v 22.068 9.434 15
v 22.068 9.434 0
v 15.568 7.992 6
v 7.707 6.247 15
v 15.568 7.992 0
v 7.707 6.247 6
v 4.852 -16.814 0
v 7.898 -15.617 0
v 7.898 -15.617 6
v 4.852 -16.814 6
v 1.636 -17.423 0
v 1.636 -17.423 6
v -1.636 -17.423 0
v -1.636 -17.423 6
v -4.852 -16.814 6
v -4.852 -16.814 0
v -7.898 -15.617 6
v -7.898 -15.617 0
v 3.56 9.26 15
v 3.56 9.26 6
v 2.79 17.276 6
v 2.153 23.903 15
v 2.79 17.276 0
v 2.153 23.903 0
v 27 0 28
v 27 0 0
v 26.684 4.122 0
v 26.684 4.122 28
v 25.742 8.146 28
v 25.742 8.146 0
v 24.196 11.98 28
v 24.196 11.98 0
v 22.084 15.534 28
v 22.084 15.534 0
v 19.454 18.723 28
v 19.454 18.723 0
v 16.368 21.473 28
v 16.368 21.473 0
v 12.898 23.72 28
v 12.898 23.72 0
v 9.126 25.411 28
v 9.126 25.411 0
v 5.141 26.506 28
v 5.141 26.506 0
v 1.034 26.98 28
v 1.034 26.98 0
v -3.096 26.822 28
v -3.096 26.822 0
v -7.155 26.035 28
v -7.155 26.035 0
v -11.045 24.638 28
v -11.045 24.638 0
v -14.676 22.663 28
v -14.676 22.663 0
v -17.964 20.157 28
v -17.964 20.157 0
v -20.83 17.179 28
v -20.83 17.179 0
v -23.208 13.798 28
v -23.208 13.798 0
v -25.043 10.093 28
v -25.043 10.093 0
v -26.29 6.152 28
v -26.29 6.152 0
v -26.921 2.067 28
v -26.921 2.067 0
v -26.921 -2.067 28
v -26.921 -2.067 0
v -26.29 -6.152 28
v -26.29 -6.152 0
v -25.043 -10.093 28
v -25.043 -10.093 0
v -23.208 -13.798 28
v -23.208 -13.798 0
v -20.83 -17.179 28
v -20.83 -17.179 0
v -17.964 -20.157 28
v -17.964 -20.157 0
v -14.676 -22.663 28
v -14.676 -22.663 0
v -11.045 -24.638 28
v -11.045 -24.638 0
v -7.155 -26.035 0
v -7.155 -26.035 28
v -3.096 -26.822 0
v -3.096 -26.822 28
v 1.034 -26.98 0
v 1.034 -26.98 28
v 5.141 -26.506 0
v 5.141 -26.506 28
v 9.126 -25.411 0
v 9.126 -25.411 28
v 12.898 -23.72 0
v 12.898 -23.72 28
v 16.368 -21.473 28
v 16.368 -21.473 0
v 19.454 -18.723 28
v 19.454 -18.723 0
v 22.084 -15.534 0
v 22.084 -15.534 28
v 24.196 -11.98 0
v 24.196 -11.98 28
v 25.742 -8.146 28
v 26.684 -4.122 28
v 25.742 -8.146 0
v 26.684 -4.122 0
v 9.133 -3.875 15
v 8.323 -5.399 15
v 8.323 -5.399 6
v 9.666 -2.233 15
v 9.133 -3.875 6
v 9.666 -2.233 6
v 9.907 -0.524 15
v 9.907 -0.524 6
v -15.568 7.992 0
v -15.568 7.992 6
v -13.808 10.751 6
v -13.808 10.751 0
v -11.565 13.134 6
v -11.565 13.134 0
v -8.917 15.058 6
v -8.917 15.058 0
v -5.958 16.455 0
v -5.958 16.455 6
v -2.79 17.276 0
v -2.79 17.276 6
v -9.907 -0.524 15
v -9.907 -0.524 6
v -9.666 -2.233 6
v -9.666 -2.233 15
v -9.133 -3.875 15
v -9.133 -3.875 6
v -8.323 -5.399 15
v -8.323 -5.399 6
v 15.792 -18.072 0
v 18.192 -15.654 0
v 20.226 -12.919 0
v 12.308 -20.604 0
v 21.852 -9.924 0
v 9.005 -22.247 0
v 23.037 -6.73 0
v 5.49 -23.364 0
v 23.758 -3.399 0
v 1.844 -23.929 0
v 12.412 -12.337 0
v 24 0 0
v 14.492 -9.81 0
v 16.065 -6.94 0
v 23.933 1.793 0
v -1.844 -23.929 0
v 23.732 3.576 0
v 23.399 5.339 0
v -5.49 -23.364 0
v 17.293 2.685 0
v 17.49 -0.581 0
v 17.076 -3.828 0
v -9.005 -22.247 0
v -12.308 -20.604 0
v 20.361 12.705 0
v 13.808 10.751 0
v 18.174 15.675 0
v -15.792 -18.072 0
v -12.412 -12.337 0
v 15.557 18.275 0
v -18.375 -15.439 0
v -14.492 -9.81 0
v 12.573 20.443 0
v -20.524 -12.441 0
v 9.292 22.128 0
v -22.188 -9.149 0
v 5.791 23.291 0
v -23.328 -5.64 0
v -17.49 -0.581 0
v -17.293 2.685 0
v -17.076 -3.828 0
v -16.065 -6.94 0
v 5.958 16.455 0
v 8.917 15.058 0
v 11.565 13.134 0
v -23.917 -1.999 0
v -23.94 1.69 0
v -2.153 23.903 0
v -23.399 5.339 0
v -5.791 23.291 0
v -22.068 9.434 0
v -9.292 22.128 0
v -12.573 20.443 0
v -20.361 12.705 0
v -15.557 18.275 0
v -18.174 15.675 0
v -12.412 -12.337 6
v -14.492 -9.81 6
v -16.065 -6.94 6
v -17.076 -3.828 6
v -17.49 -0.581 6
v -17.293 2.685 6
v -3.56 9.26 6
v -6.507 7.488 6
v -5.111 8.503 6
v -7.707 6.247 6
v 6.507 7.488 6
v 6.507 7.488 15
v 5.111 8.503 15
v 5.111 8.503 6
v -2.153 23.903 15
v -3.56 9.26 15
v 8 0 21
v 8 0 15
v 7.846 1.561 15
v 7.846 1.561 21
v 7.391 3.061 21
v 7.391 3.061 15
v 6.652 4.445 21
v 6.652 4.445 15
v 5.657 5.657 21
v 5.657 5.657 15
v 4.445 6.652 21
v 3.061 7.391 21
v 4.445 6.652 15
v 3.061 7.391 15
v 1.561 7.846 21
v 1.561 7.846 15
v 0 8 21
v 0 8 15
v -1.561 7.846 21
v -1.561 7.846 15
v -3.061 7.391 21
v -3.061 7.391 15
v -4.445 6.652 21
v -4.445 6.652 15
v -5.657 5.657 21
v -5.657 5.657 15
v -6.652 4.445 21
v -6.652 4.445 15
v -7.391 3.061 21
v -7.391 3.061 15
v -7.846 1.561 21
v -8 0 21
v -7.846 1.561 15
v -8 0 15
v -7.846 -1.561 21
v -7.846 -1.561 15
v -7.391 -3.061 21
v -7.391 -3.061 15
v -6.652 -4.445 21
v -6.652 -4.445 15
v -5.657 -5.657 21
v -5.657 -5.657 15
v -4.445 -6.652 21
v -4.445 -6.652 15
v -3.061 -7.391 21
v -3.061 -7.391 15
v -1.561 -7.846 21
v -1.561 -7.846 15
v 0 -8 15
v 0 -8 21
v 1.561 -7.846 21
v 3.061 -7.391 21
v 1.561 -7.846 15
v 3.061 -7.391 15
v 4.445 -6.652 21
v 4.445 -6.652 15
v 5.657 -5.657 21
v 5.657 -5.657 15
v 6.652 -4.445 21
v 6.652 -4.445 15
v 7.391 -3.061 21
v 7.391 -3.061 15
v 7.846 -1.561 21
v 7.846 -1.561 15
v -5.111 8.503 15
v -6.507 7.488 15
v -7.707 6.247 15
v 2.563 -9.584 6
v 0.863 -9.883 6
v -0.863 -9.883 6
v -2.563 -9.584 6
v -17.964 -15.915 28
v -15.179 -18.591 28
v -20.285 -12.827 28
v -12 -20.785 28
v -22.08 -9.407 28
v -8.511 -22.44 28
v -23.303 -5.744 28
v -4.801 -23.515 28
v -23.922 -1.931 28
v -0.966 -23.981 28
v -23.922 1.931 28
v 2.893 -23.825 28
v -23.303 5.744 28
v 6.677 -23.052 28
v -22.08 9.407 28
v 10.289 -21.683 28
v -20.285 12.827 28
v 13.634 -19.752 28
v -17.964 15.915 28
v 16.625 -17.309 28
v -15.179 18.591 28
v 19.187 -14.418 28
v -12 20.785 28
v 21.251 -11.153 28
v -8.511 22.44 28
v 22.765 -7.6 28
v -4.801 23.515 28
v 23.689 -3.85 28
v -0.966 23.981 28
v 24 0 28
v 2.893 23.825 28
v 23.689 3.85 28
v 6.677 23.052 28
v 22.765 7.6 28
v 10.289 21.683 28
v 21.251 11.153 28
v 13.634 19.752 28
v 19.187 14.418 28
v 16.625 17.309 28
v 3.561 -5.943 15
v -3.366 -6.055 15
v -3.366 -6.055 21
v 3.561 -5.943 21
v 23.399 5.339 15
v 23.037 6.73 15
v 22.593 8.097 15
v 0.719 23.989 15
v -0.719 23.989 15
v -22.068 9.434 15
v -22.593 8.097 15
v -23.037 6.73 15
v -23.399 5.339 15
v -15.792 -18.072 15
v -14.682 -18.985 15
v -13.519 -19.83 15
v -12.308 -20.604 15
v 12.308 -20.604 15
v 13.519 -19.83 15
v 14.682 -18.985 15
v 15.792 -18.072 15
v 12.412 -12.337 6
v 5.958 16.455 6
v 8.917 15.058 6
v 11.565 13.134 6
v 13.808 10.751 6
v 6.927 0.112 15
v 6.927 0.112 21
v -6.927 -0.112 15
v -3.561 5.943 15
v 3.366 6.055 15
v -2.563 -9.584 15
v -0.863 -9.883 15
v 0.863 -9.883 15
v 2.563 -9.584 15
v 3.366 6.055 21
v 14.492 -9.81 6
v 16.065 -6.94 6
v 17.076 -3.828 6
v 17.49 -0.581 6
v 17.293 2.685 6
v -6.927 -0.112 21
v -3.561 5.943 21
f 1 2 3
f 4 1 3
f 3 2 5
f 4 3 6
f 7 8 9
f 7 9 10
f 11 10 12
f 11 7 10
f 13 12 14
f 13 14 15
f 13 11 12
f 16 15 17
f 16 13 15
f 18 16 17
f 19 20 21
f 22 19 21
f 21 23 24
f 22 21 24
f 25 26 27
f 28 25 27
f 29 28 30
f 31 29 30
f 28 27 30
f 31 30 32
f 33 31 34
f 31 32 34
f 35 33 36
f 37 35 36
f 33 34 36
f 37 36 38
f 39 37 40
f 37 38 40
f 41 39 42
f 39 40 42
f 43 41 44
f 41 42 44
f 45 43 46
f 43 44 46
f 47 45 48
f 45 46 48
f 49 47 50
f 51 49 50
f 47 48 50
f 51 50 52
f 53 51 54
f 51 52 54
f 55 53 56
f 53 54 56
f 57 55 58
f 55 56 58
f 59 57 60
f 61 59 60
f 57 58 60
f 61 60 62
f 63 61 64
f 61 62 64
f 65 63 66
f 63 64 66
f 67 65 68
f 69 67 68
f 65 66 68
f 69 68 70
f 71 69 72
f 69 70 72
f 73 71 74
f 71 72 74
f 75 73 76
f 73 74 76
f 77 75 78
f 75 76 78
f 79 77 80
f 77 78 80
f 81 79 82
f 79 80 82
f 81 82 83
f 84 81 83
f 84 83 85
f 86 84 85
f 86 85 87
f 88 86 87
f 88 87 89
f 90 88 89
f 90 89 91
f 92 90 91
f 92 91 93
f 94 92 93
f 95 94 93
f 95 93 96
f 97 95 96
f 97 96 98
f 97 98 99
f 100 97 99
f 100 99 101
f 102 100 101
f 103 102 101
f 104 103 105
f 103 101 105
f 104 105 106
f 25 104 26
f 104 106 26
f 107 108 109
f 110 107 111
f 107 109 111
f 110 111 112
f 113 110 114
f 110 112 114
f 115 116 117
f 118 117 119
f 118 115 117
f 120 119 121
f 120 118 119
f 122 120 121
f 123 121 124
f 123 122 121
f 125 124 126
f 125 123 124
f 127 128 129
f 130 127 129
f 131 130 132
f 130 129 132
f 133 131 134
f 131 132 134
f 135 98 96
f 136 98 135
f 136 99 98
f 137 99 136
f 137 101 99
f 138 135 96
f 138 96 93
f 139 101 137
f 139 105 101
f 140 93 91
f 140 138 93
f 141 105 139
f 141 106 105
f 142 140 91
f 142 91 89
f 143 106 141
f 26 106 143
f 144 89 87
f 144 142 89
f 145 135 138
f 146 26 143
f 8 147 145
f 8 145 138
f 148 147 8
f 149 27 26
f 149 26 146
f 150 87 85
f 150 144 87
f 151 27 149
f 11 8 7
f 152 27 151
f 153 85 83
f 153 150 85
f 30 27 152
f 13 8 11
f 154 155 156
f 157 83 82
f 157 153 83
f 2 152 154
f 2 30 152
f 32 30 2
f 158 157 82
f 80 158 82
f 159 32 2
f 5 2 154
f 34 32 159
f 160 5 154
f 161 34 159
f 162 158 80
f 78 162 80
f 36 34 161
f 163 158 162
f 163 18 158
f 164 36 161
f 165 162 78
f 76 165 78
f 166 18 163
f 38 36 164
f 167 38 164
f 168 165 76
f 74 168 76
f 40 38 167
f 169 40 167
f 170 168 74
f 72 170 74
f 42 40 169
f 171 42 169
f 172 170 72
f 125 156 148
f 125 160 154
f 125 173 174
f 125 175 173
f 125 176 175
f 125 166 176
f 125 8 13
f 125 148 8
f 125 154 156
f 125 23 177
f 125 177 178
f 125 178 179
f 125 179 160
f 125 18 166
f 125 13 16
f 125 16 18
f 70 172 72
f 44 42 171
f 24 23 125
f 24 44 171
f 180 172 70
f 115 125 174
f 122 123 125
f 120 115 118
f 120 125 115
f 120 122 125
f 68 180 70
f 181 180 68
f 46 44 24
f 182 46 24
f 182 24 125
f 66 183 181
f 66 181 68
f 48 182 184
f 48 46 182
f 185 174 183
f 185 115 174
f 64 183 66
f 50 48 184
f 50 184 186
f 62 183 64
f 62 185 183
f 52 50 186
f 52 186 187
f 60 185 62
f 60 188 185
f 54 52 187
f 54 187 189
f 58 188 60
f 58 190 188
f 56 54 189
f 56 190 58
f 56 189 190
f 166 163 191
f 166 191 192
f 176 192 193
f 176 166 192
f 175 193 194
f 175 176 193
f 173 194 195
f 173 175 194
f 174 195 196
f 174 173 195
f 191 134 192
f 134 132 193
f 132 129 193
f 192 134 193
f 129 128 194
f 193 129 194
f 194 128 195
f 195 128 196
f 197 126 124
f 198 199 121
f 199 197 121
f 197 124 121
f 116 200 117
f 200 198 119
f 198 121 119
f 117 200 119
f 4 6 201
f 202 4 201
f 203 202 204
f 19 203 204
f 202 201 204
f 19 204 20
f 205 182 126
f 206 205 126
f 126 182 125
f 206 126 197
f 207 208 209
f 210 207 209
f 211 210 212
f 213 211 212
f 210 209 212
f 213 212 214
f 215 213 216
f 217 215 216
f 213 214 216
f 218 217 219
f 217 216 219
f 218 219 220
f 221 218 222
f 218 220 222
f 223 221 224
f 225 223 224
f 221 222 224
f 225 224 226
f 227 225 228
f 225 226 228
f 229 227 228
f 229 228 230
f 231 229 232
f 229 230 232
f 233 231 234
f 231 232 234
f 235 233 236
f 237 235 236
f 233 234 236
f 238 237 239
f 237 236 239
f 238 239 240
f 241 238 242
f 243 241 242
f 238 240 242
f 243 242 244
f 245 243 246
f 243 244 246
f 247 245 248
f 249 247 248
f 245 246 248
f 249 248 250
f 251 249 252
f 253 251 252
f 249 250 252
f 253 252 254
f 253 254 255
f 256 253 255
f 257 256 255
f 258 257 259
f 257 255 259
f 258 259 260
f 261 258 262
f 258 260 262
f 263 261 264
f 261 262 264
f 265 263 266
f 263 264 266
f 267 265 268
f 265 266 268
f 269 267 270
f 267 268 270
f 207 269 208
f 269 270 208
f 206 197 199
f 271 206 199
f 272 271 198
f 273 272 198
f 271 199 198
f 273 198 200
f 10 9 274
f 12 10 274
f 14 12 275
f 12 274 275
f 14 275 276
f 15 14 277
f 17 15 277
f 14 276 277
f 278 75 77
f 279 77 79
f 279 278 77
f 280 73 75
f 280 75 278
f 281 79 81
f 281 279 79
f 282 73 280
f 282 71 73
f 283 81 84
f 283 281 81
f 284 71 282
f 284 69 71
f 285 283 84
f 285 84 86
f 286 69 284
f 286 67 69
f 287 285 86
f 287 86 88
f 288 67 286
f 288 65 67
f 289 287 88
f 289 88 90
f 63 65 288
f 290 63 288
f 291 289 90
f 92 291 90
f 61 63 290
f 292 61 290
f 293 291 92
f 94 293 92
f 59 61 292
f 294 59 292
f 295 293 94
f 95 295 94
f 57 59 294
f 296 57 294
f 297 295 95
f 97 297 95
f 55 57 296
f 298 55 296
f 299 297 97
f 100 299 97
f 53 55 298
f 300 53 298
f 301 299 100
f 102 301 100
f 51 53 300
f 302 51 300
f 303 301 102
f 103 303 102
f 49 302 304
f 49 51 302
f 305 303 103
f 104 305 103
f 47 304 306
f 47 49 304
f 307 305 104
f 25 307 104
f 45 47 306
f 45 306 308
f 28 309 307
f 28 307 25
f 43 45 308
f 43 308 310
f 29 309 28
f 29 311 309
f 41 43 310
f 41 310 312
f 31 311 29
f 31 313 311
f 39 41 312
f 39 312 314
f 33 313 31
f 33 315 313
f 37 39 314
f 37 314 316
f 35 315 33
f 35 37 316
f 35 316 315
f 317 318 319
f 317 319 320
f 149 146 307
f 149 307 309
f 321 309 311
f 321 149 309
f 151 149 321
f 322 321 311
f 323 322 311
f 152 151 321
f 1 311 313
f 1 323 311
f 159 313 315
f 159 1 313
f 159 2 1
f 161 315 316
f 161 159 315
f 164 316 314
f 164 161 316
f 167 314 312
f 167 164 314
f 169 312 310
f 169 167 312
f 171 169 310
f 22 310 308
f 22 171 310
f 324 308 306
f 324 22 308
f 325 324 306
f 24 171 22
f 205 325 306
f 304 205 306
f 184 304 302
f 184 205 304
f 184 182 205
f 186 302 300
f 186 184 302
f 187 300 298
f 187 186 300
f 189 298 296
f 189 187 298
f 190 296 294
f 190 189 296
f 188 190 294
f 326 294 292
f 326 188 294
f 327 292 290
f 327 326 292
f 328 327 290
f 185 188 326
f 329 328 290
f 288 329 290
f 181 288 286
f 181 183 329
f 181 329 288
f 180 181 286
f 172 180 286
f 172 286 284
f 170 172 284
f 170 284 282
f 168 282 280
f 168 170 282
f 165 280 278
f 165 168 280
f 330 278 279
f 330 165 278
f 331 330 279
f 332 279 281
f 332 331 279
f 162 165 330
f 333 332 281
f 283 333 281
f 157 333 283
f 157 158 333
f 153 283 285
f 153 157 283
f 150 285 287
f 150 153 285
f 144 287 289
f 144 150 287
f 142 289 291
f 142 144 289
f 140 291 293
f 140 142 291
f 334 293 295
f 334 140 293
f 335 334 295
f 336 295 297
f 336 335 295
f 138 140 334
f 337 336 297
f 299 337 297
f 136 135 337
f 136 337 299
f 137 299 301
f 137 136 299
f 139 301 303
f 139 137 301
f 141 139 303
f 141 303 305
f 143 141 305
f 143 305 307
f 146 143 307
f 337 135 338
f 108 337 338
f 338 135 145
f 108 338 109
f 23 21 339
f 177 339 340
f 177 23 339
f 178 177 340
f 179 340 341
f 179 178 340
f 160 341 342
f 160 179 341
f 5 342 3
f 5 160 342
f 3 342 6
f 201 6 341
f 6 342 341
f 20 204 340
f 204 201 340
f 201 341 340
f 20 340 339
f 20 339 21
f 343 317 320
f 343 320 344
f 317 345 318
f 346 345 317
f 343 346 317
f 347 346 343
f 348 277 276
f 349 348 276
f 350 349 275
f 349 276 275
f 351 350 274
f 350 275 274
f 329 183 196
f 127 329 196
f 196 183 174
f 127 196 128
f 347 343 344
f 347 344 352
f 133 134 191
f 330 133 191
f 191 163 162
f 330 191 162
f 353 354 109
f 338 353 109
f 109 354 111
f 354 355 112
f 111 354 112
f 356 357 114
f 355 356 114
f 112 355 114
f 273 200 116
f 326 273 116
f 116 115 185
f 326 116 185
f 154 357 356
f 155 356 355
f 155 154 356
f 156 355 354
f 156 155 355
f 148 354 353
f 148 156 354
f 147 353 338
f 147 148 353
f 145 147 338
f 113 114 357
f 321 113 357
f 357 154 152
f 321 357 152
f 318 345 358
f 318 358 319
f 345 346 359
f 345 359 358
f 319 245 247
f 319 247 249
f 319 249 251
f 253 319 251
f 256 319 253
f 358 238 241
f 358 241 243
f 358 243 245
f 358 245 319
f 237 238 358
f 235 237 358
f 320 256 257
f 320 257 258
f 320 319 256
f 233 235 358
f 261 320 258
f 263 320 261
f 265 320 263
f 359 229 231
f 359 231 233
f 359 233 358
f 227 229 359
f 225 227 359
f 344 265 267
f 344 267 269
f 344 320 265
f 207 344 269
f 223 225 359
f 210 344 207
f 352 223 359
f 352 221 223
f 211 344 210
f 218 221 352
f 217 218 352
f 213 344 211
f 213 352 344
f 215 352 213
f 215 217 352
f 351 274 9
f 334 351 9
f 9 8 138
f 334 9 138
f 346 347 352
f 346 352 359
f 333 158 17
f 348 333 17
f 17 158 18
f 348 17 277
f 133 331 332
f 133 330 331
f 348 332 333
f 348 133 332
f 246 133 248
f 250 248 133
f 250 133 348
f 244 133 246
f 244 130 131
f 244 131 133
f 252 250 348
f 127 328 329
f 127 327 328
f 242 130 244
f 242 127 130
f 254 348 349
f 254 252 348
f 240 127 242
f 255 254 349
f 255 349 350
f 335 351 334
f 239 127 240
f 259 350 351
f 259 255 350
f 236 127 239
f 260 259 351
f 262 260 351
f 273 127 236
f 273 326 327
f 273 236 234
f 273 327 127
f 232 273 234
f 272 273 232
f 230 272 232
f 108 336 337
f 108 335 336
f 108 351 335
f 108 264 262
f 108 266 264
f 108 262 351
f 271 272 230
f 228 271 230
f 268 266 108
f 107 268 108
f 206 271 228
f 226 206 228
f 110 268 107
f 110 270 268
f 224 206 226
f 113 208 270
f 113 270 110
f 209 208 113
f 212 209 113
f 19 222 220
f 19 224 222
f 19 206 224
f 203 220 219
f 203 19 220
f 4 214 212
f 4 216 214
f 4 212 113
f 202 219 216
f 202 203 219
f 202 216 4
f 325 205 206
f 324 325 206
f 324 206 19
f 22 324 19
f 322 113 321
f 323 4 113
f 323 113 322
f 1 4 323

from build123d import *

# Parameters (mm, degrees)
SKETCH_1_R      = 27
SKETCH_1_R_2    = 24
EXTRUDE_1_DEPTH = 28
EXTRUDE_2_DEPTH = 15
SKETCH_3_R      = 8
EXTRUDE_3_DEPTH = 6
SKETCH_4_R      = 17.5
EXTRUDE_4_DEPTH = 6


with BuildPart() as part:
    # 草图1 → 凸台-拉伸1 (new body)
    with BuildSketch(Plane.XY):
        Circle(SKETCH_1_R)
        Circle(SKETCH_1_R_2, mode=Mode.SUBTRACT)
    extrude(amount=EXTRUDE_1_DEPTH)

    # 草图2 → 凸台-拉伸2 (add)
    with BuildSketch(Plane.XY):
        with BuildLine():
            Line((-2, 25.5), (-3.56, 9.26))
            ThreePointArc((-3.56, 9.26), (-5.831268155, 8.026052062), (-7.706682841, 6.247258566))
            Line((-7.706682841, 6.247258566), (-23.633907177, 9.782046389))
            Line((-23.633907177, 9.782046389), (-24.869975154, 5.977820324))
            Line((-24.869975154, 5.977820324), (-9.906883841, -0.52426383))
            ThreePointArc((-9.906883841, -0.52426383), (-9.435190072, -3.065679092), (-8.322991936, -5.39898187))
            Line((-8.322991936, -5.39898187), (-16.606557922, -19.454362852))
            Line((-16.606557922, -19.454362852), (-13.370489945, -21.805503861))
            Line((-13.370489945, -21.805503861), (-2.562790936, -9.584012866))
            ThreePointArc((-2.562790936, -9.584012866), (0, -9.92074594), (2.562790936, -9.584012866))
            Line((2.562790936, -9.584012866), (13.370489945, -21.805503861))
            Line((13.370489945, -21.805503861), (16.606557922, -19.454362852))
            Line((16.606557922, -19.454362852), (8.322991936, -5.39898187))
            ThreePointArc((8.322991936, -5.39898187), (9.435190072, -3.065679092), (9.906883841, -0.52426383))
            Line((9.906883841, -0.52426383), (24.869975154, 5.977820324))
            Line((24.869975154, 5.977820324), (23.633907177, 9.782046389))
            Line((23.633907177, 9.782046389), (7.706682841, 6.247258566))
            ThreePointArc((7.706682841, 6.247258566), (5.831268155, 8.026052062), (3.56, 9.26))
            Line((3.56, 9.26), (2, 25.5))
            Line((2, 25.5), (-2, 25.5))
        make_face()
    extrude(amount=EXTRUDE_2_DEPTH)

    # 草图3 → 凸台-拉伸3 (add)
    with BuildSketch(Plane.XY.offset(15)):
        Circle(SKETCH_3_R)
        Polygon((3.560842768, -5.943096733), (6.927294132, 0.11223193), (3.366451364, 6.055328663), (-3.560842768, 5.943096733), (-6.927294132, -0.11223193), (-3.366451364, -6.055328663), align=None, mode=Mode.SUBTRACT)
    extrude(amount=EXTRUDE_3_DEPTH)

    # 草图4 → 凸台-拉伸4 (add)
    with BuildSketch(Plane(origin=(0, 0, 0), x_dir=(-1, 0, 0), z_dir=(0, 0, -1))):
        Circle(SKETCH_4_R)
    extrude(amount=-EXTRUDE_4_DEPTH)


solid = part.part
